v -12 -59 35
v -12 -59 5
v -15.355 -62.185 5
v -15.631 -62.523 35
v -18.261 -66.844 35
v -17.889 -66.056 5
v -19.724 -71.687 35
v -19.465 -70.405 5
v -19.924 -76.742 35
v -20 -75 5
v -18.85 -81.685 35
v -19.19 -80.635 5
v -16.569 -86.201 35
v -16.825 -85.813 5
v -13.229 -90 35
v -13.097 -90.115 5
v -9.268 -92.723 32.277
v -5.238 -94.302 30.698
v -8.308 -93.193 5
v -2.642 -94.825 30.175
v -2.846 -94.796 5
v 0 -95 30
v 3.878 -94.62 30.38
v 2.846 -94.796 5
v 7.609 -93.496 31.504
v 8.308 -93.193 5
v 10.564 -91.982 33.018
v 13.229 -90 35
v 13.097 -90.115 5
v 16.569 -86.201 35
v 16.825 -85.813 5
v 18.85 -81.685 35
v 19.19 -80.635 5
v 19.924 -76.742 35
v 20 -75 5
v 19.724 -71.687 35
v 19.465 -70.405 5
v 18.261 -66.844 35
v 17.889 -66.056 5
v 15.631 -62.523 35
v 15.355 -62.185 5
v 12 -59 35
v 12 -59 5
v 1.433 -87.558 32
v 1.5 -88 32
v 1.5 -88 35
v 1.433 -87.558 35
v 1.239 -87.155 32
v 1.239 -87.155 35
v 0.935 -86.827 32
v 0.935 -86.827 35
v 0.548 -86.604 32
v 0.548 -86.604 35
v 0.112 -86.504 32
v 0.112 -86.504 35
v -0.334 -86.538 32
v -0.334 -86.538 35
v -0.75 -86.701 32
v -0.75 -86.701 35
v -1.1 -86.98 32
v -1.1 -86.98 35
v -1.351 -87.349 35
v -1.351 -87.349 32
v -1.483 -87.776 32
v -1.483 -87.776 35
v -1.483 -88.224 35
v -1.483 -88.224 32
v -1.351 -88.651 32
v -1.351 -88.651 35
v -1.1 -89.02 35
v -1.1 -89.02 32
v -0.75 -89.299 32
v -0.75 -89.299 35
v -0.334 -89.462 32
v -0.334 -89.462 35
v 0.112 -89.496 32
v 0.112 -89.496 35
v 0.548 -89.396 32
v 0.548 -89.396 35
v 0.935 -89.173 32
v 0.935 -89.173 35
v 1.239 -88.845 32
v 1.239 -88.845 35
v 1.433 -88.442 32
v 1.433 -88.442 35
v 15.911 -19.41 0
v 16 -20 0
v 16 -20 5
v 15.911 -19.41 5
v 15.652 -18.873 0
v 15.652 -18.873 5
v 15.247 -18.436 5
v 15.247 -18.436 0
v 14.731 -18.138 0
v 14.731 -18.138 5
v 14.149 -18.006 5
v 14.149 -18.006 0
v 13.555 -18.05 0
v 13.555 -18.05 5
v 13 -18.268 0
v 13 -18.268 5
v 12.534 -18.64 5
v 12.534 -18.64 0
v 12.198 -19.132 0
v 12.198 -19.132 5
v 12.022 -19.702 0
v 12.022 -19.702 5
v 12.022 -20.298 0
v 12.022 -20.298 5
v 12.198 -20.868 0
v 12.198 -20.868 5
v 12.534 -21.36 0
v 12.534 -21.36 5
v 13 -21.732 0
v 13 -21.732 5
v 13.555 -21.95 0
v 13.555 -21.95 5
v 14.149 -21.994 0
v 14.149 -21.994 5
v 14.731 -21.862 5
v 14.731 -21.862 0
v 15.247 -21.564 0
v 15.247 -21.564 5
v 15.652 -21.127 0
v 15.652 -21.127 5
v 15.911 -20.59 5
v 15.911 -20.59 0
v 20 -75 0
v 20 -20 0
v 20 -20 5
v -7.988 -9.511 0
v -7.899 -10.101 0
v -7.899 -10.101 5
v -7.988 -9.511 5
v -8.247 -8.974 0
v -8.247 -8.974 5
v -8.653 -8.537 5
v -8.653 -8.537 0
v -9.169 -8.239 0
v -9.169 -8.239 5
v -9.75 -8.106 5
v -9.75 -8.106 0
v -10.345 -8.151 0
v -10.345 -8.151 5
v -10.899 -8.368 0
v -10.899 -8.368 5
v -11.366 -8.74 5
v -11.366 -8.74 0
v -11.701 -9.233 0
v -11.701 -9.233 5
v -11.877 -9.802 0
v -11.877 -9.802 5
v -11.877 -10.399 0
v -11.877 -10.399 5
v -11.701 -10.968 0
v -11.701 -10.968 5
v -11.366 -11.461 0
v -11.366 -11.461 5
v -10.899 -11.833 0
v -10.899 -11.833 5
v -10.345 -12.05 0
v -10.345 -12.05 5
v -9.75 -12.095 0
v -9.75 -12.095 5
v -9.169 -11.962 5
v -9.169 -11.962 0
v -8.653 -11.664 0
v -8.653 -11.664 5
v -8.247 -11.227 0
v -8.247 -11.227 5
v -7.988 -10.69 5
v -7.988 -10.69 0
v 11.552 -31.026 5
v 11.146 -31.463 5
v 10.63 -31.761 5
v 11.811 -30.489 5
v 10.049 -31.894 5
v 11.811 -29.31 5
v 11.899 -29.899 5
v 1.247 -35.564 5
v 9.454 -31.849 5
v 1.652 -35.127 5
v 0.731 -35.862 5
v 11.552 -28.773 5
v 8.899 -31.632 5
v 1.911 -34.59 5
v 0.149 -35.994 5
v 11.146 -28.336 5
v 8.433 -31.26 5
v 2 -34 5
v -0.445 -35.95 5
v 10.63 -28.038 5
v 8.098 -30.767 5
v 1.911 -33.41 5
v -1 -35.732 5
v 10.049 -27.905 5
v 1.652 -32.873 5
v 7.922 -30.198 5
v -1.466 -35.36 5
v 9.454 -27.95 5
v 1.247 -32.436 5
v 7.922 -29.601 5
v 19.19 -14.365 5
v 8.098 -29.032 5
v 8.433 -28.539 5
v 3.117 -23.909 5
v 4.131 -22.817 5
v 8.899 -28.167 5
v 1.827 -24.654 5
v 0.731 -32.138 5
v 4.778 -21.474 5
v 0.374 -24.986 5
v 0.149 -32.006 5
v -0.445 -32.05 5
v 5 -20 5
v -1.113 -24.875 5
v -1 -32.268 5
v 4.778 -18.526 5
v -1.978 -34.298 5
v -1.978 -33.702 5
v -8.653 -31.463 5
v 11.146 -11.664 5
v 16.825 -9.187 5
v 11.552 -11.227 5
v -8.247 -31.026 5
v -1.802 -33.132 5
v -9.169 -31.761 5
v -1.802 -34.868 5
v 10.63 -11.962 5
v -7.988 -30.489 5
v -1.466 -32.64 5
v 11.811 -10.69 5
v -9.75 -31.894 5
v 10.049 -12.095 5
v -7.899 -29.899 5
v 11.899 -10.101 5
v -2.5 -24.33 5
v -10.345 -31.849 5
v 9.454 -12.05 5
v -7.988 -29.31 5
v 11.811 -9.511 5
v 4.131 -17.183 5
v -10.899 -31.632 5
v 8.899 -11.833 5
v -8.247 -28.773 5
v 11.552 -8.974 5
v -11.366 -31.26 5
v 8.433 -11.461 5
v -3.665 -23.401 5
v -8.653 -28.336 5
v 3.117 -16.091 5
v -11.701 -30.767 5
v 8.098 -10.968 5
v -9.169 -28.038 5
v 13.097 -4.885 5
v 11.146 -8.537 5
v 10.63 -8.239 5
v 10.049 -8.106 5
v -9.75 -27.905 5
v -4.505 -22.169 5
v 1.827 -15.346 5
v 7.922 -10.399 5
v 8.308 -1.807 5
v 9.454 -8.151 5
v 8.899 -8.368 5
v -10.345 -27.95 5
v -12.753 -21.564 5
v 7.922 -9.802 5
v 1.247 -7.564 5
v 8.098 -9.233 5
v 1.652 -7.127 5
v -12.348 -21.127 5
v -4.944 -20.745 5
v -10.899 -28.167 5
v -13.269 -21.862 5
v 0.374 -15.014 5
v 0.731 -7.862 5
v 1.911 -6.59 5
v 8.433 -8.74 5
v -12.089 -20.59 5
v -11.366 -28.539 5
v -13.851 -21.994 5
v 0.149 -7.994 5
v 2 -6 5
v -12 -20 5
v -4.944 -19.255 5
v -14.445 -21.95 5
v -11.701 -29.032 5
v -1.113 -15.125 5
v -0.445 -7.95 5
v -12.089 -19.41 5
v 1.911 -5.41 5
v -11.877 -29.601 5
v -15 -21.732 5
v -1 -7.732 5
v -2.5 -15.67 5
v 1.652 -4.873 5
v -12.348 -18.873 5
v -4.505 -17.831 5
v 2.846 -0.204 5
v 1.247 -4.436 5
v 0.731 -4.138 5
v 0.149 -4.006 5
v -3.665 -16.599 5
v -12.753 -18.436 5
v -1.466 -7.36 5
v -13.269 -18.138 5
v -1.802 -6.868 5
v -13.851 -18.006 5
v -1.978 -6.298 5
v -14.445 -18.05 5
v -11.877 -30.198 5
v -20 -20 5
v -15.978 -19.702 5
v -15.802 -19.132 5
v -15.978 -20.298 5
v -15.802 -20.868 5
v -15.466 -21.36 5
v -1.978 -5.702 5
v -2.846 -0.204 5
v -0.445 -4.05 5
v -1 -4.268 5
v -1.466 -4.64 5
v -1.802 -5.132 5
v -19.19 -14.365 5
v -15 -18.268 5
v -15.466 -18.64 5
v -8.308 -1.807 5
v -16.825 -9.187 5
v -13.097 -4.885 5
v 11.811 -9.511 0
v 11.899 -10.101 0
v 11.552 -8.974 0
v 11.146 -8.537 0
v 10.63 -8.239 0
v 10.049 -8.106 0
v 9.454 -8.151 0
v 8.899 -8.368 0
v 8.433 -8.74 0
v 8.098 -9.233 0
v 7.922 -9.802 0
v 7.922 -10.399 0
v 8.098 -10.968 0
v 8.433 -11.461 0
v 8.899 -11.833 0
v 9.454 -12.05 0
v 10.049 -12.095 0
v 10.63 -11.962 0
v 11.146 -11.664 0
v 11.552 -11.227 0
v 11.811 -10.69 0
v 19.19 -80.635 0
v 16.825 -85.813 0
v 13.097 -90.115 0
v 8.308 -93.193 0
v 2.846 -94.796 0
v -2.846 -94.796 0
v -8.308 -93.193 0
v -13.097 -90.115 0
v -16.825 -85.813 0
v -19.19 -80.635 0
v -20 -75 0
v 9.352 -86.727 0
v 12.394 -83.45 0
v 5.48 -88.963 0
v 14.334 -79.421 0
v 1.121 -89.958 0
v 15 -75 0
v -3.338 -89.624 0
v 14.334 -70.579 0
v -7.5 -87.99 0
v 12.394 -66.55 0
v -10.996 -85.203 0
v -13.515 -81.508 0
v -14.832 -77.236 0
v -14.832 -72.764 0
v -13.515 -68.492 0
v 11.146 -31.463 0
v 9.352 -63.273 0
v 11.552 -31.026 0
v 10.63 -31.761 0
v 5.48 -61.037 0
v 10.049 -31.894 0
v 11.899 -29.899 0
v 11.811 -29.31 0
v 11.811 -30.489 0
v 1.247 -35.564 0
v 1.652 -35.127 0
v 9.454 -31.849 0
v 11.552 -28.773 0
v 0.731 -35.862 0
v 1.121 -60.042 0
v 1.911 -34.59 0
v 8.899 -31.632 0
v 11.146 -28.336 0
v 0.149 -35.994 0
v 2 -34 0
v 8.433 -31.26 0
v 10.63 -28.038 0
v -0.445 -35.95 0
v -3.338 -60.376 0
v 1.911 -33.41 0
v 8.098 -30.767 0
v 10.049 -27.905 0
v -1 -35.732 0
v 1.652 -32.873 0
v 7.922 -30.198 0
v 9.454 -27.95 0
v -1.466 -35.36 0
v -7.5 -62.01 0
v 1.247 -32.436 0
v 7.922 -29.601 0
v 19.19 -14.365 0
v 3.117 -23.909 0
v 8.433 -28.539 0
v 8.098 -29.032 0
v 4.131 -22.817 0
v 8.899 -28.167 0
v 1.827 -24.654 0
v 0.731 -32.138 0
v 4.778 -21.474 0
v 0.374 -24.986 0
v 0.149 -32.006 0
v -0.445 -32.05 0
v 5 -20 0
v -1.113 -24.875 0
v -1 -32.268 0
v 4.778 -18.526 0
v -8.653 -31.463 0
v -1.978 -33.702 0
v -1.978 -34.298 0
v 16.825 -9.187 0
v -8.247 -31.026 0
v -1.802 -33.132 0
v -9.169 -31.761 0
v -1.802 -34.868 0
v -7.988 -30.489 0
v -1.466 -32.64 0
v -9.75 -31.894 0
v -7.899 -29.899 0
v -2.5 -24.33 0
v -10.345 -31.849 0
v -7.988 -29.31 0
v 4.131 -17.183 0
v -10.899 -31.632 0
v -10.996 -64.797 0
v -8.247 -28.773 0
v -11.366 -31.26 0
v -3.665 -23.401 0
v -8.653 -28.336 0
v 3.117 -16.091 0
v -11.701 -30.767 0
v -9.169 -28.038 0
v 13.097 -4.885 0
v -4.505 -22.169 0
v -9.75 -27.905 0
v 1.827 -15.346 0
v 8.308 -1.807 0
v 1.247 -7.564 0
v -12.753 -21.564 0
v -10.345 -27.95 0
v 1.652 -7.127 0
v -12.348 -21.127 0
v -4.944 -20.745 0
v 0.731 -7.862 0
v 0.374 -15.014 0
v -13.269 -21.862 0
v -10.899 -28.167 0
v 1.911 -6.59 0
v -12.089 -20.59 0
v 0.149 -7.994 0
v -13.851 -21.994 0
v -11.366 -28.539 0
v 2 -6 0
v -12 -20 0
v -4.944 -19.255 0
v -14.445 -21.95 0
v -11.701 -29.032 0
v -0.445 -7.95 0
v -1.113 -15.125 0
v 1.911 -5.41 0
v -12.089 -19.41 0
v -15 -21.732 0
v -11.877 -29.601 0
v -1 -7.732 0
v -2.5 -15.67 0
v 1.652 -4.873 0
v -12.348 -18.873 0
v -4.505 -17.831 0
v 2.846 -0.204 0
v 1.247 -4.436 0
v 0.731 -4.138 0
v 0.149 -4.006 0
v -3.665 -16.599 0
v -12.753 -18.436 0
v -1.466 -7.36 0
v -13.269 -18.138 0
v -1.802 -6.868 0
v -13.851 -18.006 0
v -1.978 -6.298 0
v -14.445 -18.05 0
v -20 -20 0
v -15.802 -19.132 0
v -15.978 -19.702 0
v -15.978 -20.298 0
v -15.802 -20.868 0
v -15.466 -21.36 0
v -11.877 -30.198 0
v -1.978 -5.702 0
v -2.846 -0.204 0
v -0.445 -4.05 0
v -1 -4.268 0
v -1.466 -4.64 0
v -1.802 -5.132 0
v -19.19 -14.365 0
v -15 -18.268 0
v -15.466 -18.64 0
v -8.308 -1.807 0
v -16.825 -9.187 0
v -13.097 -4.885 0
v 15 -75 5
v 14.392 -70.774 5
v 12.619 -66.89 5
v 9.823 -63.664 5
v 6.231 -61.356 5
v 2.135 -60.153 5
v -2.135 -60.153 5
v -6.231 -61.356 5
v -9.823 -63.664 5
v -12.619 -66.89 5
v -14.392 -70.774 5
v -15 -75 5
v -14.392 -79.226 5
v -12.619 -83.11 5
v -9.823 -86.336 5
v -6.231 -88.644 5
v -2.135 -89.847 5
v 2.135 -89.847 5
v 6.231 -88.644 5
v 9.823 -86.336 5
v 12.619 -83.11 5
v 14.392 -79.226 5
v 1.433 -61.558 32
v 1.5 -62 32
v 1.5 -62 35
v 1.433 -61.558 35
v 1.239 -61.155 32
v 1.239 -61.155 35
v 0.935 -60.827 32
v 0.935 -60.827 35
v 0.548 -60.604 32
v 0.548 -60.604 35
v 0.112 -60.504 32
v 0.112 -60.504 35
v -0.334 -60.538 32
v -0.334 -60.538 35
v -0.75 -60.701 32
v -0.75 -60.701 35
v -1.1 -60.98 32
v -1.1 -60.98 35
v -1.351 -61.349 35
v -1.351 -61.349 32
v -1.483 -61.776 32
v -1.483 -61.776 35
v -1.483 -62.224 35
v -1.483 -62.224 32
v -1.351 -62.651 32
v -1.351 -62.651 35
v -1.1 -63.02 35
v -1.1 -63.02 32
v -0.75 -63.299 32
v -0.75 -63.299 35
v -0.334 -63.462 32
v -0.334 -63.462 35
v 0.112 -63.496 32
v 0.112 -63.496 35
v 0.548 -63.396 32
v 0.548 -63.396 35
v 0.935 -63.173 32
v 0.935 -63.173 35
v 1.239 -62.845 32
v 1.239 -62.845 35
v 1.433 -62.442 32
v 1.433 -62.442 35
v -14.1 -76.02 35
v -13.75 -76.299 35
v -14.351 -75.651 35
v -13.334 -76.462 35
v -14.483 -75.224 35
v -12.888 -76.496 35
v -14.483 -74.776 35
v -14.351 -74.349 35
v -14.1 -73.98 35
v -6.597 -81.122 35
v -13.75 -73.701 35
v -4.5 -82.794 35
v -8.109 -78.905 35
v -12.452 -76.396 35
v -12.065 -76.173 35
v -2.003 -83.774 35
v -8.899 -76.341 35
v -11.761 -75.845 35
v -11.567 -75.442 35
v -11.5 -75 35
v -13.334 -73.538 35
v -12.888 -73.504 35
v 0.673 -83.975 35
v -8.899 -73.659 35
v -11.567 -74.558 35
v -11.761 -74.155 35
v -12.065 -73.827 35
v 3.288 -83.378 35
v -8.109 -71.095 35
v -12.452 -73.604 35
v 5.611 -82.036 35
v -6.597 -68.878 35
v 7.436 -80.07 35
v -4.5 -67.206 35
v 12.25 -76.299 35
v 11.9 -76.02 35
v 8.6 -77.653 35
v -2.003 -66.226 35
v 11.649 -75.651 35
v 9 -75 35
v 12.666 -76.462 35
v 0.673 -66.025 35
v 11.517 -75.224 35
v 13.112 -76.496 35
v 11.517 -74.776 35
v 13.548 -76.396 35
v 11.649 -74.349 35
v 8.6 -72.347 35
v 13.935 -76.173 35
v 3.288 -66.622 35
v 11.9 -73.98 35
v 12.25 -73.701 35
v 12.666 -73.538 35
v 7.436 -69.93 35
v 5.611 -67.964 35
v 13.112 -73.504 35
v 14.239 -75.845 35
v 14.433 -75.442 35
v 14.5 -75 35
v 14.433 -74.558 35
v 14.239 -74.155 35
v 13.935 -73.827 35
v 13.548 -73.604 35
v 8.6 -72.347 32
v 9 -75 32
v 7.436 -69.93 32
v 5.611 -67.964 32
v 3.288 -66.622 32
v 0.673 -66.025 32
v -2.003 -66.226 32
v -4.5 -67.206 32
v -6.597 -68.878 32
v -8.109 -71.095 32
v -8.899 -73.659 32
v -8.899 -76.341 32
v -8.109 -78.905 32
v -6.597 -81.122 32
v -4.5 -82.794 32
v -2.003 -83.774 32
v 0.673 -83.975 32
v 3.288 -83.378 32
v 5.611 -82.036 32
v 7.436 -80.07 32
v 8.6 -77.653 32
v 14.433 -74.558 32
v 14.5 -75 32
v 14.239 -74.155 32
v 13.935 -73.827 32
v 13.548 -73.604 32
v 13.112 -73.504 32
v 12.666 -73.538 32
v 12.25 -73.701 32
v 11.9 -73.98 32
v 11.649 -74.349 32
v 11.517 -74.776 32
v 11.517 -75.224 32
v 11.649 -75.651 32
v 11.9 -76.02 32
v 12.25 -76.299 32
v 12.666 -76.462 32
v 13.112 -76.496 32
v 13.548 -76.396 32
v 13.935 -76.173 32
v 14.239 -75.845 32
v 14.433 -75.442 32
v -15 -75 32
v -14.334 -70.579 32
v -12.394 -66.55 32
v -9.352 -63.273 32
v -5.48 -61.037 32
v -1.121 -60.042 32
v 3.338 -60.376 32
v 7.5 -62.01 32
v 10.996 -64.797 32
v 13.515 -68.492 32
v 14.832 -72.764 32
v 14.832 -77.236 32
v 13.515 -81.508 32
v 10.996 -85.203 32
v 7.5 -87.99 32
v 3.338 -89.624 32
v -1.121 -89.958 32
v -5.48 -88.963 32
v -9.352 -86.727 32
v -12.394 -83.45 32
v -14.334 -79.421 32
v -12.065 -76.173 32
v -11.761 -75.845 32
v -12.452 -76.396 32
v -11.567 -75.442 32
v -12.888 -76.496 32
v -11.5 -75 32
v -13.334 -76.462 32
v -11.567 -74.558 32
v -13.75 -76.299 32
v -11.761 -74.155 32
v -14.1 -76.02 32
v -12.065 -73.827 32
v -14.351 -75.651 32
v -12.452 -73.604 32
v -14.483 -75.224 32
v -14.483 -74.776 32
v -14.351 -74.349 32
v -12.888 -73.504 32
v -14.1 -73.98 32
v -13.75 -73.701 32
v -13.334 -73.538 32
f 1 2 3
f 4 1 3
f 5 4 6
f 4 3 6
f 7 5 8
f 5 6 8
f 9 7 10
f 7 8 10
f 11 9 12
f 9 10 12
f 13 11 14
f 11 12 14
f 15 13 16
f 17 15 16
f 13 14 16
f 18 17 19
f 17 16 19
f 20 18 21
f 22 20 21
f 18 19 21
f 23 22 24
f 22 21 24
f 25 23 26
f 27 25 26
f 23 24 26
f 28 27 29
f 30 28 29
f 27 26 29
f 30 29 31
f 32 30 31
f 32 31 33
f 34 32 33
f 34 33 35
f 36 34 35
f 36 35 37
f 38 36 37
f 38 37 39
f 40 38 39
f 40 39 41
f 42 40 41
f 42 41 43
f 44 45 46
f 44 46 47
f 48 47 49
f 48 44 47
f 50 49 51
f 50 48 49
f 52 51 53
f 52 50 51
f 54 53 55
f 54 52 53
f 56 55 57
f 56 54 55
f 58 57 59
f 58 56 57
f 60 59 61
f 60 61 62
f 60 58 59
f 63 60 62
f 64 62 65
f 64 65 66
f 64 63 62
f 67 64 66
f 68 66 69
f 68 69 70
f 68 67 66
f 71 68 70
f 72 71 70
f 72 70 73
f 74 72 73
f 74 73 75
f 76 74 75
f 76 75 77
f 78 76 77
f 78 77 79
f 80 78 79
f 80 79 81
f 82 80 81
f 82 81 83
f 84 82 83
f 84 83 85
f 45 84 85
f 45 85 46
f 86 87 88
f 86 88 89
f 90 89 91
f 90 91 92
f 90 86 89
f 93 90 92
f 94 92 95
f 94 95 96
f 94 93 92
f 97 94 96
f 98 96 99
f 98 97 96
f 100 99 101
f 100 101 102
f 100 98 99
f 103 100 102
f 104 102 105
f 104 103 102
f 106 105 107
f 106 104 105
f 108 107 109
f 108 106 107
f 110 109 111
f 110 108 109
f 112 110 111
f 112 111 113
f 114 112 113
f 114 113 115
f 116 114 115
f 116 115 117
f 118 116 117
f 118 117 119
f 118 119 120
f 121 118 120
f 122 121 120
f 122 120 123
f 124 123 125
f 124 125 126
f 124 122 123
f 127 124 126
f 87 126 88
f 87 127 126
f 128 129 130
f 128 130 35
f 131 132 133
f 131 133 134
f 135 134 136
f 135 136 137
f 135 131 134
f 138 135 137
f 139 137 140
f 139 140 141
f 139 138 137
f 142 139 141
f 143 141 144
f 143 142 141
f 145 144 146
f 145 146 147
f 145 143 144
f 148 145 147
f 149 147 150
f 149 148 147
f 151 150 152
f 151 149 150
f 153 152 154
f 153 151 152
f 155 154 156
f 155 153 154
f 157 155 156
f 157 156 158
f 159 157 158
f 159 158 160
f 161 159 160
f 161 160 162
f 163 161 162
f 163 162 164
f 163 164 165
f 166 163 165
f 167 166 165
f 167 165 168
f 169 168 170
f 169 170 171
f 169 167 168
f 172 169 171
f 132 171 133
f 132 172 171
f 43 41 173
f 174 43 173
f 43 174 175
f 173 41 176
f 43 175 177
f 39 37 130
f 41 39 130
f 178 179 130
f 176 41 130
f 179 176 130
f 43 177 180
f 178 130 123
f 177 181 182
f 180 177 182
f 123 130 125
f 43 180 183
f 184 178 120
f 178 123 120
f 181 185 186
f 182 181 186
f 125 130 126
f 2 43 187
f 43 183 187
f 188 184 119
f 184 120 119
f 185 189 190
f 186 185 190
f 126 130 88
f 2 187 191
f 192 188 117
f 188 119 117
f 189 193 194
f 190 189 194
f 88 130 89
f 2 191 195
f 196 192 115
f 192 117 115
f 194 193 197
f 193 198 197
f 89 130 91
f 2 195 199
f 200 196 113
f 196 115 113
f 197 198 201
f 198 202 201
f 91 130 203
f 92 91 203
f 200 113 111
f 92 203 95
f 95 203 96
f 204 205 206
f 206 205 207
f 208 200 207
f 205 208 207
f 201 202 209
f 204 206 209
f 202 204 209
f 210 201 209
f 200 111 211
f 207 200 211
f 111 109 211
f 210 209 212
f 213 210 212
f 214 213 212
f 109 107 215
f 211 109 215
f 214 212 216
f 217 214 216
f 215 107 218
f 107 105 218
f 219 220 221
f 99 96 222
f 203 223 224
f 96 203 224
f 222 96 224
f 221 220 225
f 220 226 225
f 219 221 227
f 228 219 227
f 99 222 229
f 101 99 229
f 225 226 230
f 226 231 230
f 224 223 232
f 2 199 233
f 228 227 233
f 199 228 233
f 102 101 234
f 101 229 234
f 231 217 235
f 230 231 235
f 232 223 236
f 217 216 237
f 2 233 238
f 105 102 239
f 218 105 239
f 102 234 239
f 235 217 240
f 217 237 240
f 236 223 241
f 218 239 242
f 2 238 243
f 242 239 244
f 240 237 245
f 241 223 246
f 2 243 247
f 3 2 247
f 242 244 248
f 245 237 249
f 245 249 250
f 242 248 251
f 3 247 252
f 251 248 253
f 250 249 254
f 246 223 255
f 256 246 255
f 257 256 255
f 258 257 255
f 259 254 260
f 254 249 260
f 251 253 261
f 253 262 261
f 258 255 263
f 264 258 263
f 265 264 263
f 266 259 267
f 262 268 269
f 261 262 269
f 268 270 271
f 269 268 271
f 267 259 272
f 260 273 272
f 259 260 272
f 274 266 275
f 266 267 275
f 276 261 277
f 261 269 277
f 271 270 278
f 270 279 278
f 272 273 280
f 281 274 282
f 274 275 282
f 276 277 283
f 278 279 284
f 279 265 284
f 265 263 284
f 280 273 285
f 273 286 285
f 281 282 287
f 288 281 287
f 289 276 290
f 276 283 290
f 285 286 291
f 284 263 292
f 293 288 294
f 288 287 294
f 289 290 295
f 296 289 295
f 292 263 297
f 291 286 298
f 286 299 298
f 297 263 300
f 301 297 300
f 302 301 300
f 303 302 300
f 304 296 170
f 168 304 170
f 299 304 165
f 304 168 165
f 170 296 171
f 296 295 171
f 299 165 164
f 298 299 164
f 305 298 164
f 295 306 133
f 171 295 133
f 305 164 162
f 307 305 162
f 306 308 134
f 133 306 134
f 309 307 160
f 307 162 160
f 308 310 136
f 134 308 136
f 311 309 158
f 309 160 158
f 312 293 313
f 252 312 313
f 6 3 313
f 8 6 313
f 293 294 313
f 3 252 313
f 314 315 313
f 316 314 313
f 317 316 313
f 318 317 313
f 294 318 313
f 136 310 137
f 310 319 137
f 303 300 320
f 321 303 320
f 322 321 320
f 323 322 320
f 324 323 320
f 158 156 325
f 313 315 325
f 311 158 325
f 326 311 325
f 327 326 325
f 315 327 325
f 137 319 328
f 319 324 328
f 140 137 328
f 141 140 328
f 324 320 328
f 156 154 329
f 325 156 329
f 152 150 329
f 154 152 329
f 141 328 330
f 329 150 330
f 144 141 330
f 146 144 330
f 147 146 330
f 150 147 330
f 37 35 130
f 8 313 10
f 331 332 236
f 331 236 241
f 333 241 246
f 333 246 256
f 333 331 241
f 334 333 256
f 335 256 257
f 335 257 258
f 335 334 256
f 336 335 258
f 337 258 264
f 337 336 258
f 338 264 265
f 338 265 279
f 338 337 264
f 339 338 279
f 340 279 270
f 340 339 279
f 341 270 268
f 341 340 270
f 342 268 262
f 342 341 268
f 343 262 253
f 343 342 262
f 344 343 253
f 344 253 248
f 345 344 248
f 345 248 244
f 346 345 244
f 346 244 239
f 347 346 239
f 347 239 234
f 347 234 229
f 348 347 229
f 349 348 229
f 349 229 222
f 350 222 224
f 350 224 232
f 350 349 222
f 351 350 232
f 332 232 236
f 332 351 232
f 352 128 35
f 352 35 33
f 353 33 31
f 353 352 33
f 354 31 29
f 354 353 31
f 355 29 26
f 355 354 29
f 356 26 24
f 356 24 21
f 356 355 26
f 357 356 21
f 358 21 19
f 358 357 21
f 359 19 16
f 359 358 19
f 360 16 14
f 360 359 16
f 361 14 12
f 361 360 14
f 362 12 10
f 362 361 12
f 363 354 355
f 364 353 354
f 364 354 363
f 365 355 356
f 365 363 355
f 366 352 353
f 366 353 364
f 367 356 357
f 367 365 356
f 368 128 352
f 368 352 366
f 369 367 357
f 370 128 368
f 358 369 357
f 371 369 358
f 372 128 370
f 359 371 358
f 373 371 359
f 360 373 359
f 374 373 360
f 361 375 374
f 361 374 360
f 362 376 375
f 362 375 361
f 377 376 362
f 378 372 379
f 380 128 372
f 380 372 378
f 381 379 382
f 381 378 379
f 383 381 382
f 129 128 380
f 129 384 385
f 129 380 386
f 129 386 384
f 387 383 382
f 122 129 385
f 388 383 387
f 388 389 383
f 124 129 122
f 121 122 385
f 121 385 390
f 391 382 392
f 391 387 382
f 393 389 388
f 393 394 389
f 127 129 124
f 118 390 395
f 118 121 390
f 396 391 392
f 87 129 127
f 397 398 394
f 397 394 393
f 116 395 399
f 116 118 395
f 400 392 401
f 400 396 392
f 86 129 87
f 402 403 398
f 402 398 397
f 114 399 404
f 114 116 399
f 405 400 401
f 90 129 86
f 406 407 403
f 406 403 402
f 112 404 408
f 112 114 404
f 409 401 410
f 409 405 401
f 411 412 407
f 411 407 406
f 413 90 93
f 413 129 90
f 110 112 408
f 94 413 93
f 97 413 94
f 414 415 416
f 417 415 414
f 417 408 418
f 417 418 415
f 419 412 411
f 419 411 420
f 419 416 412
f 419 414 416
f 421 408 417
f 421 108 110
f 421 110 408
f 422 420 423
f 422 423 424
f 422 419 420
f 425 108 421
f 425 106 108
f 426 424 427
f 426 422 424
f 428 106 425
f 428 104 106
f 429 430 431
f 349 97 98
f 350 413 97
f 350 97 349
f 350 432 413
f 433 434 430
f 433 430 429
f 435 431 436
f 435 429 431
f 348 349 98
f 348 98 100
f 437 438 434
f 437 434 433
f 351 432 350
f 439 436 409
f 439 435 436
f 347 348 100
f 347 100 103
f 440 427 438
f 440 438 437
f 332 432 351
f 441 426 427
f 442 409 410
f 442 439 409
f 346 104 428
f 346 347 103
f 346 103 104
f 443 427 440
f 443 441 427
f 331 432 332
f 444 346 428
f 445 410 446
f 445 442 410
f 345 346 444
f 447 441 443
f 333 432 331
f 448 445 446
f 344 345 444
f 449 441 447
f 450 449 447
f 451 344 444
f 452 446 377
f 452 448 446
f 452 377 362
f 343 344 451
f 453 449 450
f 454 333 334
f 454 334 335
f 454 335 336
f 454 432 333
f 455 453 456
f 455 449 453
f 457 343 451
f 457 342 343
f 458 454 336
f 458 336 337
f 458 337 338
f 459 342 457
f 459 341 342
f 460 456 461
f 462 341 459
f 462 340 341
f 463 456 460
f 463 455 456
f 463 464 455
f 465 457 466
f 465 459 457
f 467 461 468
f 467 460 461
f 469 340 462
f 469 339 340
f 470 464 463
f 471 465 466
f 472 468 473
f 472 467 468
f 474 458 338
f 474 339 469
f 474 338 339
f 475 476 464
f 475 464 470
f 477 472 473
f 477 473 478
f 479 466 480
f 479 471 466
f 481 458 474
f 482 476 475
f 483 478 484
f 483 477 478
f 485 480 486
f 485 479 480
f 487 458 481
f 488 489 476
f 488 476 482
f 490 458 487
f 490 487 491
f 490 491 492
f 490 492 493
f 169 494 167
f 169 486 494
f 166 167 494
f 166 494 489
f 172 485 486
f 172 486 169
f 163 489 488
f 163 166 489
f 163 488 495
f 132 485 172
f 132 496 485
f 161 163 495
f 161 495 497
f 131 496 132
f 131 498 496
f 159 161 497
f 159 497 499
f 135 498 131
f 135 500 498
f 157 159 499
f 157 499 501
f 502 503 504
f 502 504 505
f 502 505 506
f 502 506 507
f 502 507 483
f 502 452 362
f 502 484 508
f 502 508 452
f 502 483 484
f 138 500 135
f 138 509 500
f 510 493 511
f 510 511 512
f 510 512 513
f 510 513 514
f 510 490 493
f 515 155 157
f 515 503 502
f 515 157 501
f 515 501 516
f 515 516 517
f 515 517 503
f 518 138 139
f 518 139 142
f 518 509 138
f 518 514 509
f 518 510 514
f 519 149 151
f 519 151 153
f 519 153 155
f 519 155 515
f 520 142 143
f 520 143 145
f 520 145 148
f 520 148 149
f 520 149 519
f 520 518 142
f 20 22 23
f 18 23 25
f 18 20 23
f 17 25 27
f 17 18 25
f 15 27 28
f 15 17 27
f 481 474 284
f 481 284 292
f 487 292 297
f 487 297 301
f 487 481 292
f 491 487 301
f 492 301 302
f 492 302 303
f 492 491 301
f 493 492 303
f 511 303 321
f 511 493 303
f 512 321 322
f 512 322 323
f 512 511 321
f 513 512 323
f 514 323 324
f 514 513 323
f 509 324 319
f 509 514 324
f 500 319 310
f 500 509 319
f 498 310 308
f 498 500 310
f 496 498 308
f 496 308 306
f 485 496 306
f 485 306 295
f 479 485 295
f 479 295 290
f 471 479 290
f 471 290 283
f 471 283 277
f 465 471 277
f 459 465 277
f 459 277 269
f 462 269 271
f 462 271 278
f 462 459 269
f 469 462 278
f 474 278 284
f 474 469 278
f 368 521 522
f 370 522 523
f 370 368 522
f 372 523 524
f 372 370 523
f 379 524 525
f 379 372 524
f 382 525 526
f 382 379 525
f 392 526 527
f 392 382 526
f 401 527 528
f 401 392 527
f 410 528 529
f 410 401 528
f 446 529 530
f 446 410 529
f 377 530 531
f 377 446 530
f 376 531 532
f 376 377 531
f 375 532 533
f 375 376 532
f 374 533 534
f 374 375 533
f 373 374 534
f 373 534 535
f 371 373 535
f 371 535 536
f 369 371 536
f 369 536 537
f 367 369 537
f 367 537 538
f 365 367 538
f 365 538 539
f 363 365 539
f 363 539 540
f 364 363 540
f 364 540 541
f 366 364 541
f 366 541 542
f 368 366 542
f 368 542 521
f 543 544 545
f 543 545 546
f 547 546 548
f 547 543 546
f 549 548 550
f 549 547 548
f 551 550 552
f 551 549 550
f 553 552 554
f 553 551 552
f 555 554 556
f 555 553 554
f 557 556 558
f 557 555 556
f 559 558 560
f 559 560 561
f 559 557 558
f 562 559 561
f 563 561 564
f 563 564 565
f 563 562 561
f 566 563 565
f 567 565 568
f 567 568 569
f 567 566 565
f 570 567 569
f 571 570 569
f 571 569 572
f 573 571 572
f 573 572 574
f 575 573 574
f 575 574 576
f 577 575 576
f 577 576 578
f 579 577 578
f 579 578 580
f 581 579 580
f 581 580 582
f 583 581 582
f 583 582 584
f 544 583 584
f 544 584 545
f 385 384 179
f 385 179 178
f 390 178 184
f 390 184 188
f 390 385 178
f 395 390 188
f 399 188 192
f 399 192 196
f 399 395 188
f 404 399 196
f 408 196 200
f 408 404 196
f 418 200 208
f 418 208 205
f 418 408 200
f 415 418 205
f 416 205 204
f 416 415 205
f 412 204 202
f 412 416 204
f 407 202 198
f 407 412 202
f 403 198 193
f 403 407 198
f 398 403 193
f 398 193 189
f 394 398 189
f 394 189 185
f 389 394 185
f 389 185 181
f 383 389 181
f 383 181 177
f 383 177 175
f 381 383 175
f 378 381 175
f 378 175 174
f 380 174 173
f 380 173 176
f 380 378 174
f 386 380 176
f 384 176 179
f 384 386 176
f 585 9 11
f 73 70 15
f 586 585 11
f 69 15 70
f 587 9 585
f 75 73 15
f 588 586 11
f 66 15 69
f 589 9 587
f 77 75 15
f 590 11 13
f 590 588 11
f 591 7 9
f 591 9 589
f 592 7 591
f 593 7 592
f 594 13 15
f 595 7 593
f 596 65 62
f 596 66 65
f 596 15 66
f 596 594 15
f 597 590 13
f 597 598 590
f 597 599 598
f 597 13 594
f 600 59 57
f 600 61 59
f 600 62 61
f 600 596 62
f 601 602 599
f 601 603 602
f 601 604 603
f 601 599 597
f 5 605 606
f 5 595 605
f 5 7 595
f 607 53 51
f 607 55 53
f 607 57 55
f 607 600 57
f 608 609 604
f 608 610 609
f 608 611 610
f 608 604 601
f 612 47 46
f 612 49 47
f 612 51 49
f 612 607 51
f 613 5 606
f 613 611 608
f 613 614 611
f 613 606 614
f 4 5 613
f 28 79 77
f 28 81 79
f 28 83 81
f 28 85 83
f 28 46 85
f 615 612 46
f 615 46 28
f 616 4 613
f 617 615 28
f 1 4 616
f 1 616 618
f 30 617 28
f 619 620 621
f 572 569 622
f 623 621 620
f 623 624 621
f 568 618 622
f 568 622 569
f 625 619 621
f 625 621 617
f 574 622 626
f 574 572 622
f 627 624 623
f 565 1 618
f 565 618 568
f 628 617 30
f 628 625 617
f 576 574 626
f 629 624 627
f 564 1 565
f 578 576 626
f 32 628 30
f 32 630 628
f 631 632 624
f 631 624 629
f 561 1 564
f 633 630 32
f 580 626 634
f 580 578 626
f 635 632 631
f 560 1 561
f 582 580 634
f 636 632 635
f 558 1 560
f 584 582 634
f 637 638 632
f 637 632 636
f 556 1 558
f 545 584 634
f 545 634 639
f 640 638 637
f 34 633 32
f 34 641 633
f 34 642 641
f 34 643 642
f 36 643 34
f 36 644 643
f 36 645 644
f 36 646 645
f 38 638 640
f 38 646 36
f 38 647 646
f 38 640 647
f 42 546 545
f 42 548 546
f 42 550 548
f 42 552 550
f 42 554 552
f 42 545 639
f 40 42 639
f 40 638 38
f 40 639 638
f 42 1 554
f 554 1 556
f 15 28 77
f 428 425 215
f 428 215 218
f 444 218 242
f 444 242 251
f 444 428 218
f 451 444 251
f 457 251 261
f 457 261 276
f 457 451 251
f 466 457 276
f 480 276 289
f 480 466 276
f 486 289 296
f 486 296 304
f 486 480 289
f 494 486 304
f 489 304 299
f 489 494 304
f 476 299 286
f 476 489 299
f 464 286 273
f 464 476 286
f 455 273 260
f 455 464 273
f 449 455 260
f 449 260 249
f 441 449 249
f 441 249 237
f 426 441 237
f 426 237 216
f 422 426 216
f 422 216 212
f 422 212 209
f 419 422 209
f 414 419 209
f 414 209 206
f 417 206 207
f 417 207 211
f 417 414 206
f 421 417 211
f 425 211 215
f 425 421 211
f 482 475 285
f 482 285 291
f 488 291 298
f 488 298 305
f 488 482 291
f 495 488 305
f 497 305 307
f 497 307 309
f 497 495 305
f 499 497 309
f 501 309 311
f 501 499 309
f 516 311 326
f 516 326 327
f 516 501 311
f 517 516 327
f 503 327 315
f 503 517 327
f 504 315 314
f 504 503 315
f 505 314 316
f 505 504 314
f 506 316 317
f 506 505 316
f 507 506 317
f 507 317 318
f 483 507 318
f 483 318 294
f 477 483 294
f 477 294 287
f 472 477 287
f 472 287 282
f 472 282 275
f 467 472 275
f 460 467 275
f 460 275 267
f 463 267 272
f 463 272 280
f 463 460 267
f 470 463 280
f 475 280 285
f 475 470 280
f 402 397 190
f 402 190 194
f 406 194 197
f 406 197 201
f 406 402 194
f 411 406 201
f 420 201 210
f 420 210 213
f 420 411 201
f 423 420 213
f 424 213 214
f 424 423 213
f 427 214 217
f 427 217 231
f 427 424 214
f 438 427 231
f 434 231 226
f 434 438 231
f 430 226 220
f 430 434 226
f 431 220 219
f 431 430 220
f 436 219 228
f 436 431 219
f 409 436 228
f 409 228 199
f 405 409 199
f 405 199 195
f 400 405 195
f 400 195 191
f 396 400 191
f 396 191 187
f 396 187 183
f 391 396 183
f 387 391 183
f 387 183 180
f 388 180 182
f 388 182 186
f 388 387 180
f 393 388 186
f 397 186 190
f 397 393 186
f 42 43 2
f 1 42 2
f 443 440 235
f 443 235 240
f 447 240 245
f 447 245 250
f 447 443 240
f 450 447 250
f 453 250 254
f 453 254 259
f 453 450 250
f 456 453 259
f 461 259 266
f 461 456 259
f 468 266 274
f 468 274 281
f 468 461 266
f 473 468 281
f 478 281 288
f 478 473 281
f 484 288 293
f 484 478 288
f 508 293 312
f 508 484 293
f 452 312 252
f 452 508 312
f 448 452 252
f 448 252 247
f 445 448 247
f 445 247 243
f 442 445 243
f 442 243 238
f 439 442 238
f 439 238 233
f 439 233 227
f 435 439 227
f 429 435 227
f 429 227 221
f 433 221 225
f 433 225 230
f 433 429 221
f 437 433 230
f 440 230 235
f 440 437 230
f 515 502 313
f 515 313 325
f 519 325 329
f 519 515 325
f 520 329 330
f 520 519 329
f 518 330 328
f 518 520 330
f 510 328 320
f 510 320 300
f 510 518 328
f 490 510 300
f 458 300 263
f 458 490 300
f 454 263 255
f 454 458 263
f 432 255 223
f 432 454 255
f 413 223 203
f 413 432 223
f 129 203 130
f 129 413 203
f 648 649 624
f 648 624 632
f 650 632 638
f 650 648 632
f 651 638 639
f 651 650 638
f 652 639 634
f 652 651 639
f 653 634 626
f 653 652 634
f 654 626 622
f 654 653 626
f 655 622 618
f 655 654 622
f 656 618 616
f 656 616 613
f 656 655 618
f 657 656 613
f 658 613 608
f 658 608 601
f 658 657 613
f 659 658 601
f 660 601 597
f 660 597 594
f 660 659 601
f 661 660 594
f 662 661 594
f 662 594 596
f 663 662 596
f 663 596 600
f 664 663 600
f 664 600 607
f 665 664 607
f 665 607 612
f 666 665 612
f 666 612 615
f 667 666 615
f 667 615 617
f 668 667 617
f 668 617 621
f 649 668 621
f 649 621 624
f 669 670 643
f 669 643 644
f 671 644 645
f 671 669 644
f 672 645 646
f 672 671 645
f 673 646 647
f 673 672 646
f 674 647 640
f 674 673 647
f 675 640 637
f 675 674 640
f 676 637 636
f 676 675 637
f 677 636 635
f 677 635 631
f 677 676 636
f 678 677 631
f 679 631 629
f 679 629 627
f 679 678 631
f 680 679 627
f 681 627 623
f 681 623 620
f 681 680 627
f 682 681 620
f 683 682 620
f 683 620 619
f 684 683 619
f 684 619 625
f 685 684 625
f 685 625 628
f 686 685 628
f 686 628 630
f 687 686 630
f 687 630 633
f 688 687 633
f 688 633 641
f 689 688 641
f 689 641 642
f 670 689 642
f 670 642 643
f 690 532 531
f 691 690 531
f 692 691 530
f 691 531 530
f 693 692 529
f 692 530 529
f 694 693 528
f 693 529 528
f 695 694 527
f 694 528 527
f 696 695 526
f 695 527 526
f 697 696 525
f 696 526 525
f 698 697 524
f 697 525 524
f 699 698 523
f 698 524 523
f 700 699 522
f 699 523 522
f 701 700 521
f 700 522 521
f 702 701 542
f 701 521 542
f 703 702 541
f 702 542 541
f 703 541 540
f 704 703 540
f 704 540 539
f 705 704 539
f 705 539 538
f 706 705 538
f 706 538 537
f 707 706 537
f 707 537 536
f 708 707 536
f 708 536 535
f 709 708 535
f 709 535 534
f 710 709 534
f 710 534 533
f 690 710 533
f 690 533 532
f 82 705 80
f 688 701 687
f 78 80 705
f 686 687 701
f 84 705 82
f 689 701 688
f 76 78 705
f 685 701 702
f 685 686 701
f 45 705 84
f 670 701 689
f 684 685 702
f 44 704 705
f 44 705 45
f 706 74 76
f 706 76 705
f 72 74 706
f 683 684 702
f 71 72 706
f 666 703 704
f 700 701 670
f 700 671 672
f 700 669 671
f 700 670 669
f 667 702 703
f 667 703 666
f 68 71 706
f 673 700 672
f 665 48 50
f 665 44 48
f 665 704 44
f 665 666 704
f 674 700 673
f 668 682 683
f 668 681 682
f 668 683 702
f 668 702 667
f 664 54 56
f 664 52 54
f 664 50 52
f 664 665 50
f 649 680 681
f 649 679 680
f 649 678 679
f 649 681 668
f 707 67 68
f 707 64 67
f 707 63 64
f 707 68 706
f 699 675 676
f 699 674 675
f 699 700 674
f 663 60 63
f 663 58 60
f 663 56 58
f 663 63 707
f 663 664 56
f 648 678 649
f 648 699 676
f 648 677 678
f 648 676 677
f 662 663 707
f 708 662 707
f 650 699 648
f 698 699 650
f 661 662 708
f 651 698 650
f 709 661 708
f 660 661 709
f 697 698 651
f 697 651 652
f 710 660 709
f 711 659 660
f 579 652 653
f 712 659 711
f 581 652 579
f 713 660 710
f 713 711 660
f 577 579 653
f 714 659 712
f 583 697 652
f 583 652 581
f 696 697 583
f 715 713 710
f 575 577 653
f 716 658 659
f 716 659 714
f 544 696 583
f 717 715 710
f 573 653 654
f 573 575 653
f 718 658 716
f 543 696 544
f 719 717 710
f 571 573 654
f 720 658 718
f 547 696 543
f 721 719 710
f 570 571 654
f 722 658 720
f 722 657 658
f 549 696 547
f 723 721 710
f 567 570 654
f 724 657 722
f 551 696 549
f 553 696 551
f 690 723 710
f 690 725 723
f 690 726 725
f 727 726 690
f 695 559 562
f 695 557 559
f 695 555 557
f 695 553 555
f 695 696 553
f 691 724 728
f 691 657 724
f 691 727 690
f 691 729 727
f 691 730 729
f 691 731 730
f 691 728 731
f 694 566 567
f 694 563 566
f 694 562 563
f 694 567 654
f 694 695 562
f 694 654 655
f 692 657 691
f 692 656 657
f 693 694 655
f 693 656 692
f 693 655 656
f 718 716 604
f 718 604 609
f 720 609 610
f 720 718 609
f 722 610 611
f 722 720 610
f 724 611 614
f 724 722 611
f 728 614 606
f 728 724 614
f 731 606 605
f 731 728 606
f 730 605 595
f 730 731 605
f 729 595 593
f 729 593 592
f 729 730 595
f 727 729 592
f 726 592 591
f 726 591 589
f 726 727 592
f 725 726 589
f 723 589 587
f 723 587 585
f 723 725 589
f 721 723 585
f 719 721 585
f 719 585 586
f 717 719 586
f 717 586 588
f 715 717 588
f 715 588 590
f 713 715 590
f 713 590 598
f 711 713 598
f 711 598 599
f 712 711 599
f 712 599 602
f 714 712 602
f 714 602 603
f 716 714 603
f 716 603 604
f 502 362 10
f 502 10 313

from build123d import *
from build123d.topology import SkipClean

# Parameters (mm, degrees)
ESQUISSE1_R           = 15
ESQUISSE1_R_2         = 5
ESQUISSE1_R_3         = 2
EXTRUSION1_DEPTH      = 5
ESQUISSE2_R           = 9
ESQUISSE2_R_2         = 1.5
EXTRUSION2_DEPTH      = 30
ESQUISSE3_R           = 15
EXTRUSION3_DEPTH      = 27
EXTRUSION4_DEPTH      = 104.198837203
EXTRUSION4_DEPTH_BACK = 104.198837203


with BuildPart() as part:
    # Esquisse1 → Extrusion1 (new body)
    with BuildSketch(Plane.XY):
        with BuildLine():
            Line((20, -20), (20, -75))
            ThreePointArc((20, -75), (0, -95), (-20, -75))
            Line((-20, -75), (-20, -20))
            ThreePointArc((-20, -20), (0, 0), (20, -20))
        make_face()
        with Locations((0, -75)):
            Circle(ESQUISSE1_R, mode=Mode.SUBTRACT)
        with Locations((0, -20)):
            Circle(ESQUISSE1_R_2, mode=Mode.SUBTRACT)
        with Locations((-14, -20)):
            Circle(ESQUISSE1_R_3, mode=Mode.SUBTRACT)
        with Locations((-9.899494937, -10.100505063)):
            Circle(ESQUISSE1_R_3, mode=Mode.SUBTRACT)
        with Locations((0, -6)):
            Circle(ESQUISSE1_R_3, mode=Mode.SUBTRACT)
        with Locations((9.899494937, -10.100505063)):
            Circle(ESQUISSE1_R_3, mode=Mode.SUBTRACT)
        with Locations((14, -20)):
            Circle(ESQUISSE1_R_3, mode=Mode.SUBTRACT)
        with Locations((9.899494937, -29.899494937)):
            Circle(ESQUISSE1_R_3, mode=Mode.SUBTRACT)
        with Locations((0, -34)):
            Circle(ESQUISSE1_R_3, mode=Mode.SUBTRACT)
        with Locations((-9.899494937, -29.899494937)):
            Circle(ESQUISSE1_R_3, mode=Mode.SUBTRACT)
    extrude(amount=EXTRUSION1_DEPTH)

    # Esquisse2 → Extrusion2 (add)
    with SkipClean():  # the faces are left unmerged after this step: merging them gives an invalid solid
        with BuildSketch(Plane.XY.offset(5)):
            with BuildLine():
                Line((12, -59), (-12, -59))
                ThreePointArc((-12, -59), (0, -95), (12, -59))
            make_face()
            with Locations((0, -75)):
                Circle(ESQUISSE2_R, mode=Mode.SUBTRACT)
            with Locations((0, -62)):
                Circle(ESQUISSE2_R_2, mode=Mode.SUBTRACT)
            with Locations((0, -88)):
                Circle(ESQUISSE2_R_2, mode=Mode.SUBTRACT)
            with Locations((-13, -75)):
                Circle(ESQUISSE2_R_2, mode=Mode.SUBTRACT)
            with Locations((13, -75)):
                Circle(ESQUISSE2_R_2, mode=Mode.SUBTRACT)
        extrude(amount=EXTRUSION2_DEPTH)

    # Esquisse3 → Extrusion3 (cut)
    with SkipClean():  # the faces are left unmerged after this step: merging them gives an invalid solid
        with BuildSketch(Plane(origin=(0, 0, 5), x_dir=(-1, 0, 0), z_dir=(0, 0, -1))):
            with Locations((0, -75)):
                Circle(ESQUISSE3_R)
        extrude(amount=-EXTRUSION3_DEPTH, mode=Mode.SUBTRACT)

    # Esquisse4 → Extrusion4 (cut, two sides: drawn at the far end of the back side and taken through both)
    with SkipClean():  # the faces are left unmerged after this step: merging them gives an invalid solid
        with BuildSketch(Plane(origin=(0, 0, 0), x_dir=(0, 0, -1), z_dir=(1, 0, 0)).offset(-EXTRUSION4_DEPTH_BACK)):
            Polygon((-35, -95), (-30, -95), (-35, -90), align=None)
        extrude(amount=EXTRUSION4_DEPTH + EXTRUSION4_DEPTH_BACK, mode=Mode.SUBTRACT)


solid = part.part
